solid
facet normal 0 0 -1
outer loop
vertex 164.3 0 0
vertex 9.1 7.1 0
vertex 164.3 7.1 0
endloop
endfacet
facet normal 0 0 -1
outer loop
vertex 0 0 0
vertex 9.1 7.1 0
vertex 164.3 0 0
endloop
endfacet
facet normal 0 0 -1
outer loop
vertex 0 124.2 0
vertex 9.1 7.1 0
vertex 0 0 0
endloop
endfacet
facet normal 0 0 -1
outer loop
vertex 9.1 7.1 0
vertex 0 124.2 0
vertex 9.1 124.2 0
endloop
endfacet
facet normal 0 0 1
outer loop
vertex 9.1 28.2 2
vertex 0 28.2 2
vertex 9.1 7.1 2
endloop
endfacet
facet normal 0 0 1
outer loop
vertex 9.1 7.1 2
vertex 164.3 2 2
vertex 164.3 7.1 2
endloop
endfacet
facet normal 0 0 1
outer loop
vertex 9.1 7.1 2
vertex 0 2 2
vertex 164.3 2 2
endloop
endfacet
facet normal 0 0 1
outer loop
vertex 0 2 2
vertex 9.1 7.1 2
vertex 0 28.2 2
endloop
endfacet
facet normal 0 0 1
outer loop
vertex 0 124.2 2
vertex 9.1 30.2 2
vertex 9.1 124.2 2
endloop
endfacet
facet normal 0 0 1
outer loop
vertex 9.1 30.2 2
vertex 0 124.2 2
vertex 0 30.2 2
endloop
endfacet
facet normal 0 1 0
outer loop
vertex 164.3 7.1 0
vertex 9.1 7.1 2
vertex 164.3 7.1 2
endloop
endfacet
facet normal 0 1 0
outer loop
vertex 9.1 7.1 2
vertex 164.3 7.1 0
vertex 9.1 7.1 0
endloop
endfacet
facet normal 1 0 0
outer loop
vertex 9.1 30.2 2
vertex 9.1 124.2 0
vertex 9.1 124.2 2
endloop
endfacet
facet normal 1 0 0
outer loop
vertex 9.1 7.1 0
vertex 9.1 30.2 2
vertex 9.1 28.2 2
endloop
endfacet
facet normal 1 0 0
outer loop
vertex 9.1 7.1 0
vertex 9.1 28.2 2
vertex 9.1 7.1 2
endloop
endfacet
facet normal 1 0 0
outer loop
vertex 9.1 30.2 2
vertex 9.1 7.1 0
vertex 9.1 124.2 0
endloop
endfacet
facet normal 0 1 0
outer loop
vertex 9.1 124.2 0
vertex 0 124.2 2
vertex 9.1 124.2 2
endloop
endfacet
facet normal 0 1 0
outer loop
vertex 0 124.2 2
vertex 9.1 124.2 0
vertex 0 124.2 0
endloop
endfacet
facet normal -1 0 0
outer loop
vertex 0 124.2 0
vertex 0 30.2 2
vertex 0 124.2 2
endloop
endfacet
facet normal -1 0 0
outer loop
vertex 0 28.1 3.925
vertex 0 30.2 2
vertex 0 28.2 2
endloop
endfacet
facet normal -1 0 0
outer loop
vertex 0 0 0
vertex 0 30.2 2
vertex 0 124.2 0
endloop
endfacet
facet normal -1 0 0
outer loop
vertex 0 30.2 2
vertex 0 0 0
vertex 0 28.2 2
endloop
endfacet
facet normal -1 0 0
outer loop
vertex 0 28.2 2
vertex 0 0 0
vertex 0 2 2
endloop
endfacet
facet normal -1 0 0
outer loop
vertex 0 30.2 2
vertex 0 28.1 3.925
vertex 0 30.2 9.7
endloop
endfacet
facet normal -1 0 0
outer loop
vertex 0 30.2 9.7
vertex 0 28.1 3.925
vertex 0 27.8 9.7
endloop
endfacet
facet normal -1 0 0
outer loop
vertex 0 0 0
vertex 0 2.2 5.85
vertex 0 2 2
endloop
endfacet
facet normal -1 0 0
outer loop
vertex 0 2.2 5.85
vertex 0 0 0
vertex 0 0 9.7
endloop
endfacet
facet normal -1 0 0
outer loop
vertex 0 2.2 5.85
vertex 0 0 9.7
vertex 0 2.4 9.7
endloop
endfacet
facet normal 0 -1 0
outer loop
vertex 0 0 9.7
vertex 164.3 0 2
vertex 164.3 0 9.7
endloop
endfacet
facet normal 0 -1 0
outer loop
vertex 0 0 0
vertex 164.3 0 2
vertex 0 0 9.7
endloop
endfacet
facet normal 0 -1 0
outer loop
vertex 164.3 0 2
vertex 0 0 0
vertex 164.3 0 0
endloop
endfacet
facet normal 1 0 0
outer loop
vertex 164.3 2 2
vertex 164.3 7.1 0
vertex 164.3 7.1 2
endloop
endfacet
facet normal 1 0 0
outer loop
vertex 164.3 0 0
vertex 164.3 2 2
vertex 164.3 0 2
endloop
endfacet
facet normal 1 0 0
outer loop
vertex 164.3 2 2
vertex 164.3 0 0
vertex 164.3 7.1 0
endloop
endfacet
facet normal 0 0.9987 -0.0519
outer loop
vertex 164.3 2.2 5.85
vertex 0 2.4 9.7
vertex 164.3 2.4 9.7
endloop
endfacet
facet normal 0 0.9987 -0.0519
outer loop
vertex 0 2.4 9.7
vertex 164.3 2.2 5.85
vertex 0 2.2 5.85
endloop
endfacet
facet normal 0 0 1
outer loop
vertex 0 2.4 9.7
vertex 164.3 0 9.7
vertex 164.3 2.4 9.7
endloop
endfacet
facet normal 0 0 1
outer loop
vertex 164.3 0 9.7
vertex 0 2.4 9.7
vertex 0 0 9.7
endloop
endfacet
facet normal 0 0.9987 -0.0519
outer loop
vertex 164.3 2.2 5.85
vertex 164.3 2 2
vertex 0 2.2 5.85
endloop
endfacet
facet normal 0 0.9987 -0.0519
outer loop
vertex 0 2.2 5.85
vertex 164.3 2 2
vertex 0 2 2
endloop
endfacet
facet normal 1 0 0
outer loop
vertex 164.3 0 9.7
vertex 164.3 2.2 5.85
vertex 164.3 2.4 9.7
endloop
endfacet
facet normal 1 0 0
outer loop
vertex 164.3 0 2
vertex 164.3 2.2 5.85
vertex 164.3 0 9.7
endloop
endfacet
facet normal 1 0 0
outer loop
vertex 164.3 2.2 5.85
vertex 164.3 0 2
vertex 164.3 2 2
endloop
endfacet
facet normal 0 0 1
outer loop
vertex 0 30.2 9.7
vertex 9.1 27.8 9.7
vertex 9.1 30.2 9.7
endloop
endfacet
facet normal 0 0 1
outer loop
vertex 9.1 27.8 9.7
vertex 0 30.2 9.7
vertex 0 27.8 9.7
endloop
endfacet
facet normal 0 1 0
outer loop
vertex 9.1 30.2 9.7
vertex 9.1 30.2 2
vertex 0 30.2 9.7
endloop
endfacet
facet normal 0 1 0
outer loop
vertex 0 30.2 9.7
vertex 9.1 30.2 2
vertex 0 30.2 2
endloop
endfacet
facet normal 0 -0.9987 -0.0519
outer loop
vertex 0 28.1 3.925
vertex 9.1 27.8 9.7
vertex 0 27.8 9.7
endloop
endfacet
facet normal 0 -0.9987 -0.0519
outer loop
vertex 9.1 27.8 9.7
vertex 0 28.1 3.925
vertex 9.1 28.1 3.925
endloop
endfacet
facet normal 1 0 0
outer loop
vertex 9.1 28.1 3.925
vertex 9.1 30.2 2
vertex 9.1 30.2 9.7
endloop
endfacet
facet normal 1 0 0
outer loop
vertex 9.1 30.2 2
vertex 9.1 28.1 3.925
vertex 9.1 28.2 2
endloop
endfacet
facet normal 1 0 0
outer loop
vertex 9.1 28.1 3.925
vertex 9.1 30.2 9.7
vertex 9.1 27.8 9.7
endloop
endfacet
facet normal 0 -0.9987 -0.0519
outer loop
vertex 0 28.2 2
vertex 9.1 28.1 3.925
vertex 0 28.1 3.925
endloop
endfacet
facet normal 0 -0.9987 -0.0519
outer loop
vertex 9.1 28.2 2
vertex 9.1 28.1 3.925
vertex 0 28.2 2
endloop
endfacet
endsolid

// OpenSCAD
// file: flap_dimensions.scad
/*
   Copyright 2018 Scott Bezek and the splitflap contributors

   Licensed under the Apache License, Version 2.0 (the "License");
   you may not use this file except in compliance with the License.
   You may obtain a copy of the License at

       http://www.apache.org/licenses/LICENSE-2.0

   Unless required by applicable law or agreed to in writing, software
   distributed under the License is distributed on an "AS IS" BASIS,
   WITHOUT WARRANTIES OR CONDITIONS OF ANY KIND, either express or implied.
   See the License for the specific language governing permissions and
   limitations under the License.
*/

flap_width = 155;
flap_height = 120;
flap_thickness = 1.8;  //30 / 1000 * 25.4; // 30 mil
flap_corner_radius = 0.1; // 2.88-3.48mm (used just for display)

flap_notch_height_auto = false;
flap_notch_height_default = 15;

flap_notch_height = (flap_notch_height_auto == true) ? sqrt(spool_outer_radius*spool_outer_radius - flap_pitch_radius*flap_pitch_radius) : flap_notch_height_default;

flap_notch_depth = 3.2;

flap_pin_width = 0.4;
// main file
/*
   Copyright 2018 Scott Bezek and the splitflap contributors

   Licensed under the Apache License, Version 2.0 (the "License");
   you may not use this file except in compliance with the License.
   You may obtain a copy of the License at

       http://www.apache.org/licenses/LICENSE-2.0

   Unless required by applicable law or agreed to in writing, software
   distributed under the License is distributed on an "AS IS" BASIS,
   WITHOUT WARRANTIES OR CONDITIONS OF ANY KIND, either express or implied.
   See the License for the specific language governing permissions and
   limitations under the License.
*/

include<flap_dimensions.scad>;

print_tolerance = 0.1;
jig_thickness = 2;

clamp_inset = 0.4;

punch_width = 26;
punch_lower_height = 7.7;
punch_gap_height = 2.2;
slot_inset_depth = 9.3;
slot_depth = 3;
slot_width = 15;

eps = 0.1;

jig_length = flap_width + slot_inset_depth;

union() {
    linear_extrude(height=punch_gap_height - print_tolerance*2) {
        difference() {
            square([jig_length, jig_thickness*2 + print_tolerance*2 + flap_height]);
            translate([slot_inset_depth - print_tolerance*2, jig_thickness + print_tolerance + (punch_width - slot_width)/2 - flap_pin_width - print_tolerance]) {
                square([flap_width + slot_depth + print_tolerance*2 + eps, jig_thickness + print_tolerance + flap_height - (punch_width - slot_width)/2 + flap_pin_width + print_tolerance + eps]);
            }
        }
    }

    translate([0, 0, punch_gap_height - print_tolerance*2]) {
        linear_extrude(height=punch_lower_height, scale=[1, (jig_thickness + clamp_inset)/jig_thickness]) {
           square([jig_length, jig_thickness]);
        }
    }

    translate([0, jig_thickness*2 + print_tolerance*2 + punch_width, punch_gap_height - print_tolerance*2]) {
        linear_extrude(height=punch_lower_height, scale=[1, (jig_thickness + clamp_inset)/jig_thickness]) {
            translate([0, -jig_thickness]) {
                square([slot_inset_depth - print_tolerance*2, jig_thickness]);
            }
        }
    }
}


%translate([slot_inset_depth, jig_thickness + print_tolerance + (punch_width - slot_width)/2, -8]) {
    cube([slot_depth, slot_width, 16]);
}
